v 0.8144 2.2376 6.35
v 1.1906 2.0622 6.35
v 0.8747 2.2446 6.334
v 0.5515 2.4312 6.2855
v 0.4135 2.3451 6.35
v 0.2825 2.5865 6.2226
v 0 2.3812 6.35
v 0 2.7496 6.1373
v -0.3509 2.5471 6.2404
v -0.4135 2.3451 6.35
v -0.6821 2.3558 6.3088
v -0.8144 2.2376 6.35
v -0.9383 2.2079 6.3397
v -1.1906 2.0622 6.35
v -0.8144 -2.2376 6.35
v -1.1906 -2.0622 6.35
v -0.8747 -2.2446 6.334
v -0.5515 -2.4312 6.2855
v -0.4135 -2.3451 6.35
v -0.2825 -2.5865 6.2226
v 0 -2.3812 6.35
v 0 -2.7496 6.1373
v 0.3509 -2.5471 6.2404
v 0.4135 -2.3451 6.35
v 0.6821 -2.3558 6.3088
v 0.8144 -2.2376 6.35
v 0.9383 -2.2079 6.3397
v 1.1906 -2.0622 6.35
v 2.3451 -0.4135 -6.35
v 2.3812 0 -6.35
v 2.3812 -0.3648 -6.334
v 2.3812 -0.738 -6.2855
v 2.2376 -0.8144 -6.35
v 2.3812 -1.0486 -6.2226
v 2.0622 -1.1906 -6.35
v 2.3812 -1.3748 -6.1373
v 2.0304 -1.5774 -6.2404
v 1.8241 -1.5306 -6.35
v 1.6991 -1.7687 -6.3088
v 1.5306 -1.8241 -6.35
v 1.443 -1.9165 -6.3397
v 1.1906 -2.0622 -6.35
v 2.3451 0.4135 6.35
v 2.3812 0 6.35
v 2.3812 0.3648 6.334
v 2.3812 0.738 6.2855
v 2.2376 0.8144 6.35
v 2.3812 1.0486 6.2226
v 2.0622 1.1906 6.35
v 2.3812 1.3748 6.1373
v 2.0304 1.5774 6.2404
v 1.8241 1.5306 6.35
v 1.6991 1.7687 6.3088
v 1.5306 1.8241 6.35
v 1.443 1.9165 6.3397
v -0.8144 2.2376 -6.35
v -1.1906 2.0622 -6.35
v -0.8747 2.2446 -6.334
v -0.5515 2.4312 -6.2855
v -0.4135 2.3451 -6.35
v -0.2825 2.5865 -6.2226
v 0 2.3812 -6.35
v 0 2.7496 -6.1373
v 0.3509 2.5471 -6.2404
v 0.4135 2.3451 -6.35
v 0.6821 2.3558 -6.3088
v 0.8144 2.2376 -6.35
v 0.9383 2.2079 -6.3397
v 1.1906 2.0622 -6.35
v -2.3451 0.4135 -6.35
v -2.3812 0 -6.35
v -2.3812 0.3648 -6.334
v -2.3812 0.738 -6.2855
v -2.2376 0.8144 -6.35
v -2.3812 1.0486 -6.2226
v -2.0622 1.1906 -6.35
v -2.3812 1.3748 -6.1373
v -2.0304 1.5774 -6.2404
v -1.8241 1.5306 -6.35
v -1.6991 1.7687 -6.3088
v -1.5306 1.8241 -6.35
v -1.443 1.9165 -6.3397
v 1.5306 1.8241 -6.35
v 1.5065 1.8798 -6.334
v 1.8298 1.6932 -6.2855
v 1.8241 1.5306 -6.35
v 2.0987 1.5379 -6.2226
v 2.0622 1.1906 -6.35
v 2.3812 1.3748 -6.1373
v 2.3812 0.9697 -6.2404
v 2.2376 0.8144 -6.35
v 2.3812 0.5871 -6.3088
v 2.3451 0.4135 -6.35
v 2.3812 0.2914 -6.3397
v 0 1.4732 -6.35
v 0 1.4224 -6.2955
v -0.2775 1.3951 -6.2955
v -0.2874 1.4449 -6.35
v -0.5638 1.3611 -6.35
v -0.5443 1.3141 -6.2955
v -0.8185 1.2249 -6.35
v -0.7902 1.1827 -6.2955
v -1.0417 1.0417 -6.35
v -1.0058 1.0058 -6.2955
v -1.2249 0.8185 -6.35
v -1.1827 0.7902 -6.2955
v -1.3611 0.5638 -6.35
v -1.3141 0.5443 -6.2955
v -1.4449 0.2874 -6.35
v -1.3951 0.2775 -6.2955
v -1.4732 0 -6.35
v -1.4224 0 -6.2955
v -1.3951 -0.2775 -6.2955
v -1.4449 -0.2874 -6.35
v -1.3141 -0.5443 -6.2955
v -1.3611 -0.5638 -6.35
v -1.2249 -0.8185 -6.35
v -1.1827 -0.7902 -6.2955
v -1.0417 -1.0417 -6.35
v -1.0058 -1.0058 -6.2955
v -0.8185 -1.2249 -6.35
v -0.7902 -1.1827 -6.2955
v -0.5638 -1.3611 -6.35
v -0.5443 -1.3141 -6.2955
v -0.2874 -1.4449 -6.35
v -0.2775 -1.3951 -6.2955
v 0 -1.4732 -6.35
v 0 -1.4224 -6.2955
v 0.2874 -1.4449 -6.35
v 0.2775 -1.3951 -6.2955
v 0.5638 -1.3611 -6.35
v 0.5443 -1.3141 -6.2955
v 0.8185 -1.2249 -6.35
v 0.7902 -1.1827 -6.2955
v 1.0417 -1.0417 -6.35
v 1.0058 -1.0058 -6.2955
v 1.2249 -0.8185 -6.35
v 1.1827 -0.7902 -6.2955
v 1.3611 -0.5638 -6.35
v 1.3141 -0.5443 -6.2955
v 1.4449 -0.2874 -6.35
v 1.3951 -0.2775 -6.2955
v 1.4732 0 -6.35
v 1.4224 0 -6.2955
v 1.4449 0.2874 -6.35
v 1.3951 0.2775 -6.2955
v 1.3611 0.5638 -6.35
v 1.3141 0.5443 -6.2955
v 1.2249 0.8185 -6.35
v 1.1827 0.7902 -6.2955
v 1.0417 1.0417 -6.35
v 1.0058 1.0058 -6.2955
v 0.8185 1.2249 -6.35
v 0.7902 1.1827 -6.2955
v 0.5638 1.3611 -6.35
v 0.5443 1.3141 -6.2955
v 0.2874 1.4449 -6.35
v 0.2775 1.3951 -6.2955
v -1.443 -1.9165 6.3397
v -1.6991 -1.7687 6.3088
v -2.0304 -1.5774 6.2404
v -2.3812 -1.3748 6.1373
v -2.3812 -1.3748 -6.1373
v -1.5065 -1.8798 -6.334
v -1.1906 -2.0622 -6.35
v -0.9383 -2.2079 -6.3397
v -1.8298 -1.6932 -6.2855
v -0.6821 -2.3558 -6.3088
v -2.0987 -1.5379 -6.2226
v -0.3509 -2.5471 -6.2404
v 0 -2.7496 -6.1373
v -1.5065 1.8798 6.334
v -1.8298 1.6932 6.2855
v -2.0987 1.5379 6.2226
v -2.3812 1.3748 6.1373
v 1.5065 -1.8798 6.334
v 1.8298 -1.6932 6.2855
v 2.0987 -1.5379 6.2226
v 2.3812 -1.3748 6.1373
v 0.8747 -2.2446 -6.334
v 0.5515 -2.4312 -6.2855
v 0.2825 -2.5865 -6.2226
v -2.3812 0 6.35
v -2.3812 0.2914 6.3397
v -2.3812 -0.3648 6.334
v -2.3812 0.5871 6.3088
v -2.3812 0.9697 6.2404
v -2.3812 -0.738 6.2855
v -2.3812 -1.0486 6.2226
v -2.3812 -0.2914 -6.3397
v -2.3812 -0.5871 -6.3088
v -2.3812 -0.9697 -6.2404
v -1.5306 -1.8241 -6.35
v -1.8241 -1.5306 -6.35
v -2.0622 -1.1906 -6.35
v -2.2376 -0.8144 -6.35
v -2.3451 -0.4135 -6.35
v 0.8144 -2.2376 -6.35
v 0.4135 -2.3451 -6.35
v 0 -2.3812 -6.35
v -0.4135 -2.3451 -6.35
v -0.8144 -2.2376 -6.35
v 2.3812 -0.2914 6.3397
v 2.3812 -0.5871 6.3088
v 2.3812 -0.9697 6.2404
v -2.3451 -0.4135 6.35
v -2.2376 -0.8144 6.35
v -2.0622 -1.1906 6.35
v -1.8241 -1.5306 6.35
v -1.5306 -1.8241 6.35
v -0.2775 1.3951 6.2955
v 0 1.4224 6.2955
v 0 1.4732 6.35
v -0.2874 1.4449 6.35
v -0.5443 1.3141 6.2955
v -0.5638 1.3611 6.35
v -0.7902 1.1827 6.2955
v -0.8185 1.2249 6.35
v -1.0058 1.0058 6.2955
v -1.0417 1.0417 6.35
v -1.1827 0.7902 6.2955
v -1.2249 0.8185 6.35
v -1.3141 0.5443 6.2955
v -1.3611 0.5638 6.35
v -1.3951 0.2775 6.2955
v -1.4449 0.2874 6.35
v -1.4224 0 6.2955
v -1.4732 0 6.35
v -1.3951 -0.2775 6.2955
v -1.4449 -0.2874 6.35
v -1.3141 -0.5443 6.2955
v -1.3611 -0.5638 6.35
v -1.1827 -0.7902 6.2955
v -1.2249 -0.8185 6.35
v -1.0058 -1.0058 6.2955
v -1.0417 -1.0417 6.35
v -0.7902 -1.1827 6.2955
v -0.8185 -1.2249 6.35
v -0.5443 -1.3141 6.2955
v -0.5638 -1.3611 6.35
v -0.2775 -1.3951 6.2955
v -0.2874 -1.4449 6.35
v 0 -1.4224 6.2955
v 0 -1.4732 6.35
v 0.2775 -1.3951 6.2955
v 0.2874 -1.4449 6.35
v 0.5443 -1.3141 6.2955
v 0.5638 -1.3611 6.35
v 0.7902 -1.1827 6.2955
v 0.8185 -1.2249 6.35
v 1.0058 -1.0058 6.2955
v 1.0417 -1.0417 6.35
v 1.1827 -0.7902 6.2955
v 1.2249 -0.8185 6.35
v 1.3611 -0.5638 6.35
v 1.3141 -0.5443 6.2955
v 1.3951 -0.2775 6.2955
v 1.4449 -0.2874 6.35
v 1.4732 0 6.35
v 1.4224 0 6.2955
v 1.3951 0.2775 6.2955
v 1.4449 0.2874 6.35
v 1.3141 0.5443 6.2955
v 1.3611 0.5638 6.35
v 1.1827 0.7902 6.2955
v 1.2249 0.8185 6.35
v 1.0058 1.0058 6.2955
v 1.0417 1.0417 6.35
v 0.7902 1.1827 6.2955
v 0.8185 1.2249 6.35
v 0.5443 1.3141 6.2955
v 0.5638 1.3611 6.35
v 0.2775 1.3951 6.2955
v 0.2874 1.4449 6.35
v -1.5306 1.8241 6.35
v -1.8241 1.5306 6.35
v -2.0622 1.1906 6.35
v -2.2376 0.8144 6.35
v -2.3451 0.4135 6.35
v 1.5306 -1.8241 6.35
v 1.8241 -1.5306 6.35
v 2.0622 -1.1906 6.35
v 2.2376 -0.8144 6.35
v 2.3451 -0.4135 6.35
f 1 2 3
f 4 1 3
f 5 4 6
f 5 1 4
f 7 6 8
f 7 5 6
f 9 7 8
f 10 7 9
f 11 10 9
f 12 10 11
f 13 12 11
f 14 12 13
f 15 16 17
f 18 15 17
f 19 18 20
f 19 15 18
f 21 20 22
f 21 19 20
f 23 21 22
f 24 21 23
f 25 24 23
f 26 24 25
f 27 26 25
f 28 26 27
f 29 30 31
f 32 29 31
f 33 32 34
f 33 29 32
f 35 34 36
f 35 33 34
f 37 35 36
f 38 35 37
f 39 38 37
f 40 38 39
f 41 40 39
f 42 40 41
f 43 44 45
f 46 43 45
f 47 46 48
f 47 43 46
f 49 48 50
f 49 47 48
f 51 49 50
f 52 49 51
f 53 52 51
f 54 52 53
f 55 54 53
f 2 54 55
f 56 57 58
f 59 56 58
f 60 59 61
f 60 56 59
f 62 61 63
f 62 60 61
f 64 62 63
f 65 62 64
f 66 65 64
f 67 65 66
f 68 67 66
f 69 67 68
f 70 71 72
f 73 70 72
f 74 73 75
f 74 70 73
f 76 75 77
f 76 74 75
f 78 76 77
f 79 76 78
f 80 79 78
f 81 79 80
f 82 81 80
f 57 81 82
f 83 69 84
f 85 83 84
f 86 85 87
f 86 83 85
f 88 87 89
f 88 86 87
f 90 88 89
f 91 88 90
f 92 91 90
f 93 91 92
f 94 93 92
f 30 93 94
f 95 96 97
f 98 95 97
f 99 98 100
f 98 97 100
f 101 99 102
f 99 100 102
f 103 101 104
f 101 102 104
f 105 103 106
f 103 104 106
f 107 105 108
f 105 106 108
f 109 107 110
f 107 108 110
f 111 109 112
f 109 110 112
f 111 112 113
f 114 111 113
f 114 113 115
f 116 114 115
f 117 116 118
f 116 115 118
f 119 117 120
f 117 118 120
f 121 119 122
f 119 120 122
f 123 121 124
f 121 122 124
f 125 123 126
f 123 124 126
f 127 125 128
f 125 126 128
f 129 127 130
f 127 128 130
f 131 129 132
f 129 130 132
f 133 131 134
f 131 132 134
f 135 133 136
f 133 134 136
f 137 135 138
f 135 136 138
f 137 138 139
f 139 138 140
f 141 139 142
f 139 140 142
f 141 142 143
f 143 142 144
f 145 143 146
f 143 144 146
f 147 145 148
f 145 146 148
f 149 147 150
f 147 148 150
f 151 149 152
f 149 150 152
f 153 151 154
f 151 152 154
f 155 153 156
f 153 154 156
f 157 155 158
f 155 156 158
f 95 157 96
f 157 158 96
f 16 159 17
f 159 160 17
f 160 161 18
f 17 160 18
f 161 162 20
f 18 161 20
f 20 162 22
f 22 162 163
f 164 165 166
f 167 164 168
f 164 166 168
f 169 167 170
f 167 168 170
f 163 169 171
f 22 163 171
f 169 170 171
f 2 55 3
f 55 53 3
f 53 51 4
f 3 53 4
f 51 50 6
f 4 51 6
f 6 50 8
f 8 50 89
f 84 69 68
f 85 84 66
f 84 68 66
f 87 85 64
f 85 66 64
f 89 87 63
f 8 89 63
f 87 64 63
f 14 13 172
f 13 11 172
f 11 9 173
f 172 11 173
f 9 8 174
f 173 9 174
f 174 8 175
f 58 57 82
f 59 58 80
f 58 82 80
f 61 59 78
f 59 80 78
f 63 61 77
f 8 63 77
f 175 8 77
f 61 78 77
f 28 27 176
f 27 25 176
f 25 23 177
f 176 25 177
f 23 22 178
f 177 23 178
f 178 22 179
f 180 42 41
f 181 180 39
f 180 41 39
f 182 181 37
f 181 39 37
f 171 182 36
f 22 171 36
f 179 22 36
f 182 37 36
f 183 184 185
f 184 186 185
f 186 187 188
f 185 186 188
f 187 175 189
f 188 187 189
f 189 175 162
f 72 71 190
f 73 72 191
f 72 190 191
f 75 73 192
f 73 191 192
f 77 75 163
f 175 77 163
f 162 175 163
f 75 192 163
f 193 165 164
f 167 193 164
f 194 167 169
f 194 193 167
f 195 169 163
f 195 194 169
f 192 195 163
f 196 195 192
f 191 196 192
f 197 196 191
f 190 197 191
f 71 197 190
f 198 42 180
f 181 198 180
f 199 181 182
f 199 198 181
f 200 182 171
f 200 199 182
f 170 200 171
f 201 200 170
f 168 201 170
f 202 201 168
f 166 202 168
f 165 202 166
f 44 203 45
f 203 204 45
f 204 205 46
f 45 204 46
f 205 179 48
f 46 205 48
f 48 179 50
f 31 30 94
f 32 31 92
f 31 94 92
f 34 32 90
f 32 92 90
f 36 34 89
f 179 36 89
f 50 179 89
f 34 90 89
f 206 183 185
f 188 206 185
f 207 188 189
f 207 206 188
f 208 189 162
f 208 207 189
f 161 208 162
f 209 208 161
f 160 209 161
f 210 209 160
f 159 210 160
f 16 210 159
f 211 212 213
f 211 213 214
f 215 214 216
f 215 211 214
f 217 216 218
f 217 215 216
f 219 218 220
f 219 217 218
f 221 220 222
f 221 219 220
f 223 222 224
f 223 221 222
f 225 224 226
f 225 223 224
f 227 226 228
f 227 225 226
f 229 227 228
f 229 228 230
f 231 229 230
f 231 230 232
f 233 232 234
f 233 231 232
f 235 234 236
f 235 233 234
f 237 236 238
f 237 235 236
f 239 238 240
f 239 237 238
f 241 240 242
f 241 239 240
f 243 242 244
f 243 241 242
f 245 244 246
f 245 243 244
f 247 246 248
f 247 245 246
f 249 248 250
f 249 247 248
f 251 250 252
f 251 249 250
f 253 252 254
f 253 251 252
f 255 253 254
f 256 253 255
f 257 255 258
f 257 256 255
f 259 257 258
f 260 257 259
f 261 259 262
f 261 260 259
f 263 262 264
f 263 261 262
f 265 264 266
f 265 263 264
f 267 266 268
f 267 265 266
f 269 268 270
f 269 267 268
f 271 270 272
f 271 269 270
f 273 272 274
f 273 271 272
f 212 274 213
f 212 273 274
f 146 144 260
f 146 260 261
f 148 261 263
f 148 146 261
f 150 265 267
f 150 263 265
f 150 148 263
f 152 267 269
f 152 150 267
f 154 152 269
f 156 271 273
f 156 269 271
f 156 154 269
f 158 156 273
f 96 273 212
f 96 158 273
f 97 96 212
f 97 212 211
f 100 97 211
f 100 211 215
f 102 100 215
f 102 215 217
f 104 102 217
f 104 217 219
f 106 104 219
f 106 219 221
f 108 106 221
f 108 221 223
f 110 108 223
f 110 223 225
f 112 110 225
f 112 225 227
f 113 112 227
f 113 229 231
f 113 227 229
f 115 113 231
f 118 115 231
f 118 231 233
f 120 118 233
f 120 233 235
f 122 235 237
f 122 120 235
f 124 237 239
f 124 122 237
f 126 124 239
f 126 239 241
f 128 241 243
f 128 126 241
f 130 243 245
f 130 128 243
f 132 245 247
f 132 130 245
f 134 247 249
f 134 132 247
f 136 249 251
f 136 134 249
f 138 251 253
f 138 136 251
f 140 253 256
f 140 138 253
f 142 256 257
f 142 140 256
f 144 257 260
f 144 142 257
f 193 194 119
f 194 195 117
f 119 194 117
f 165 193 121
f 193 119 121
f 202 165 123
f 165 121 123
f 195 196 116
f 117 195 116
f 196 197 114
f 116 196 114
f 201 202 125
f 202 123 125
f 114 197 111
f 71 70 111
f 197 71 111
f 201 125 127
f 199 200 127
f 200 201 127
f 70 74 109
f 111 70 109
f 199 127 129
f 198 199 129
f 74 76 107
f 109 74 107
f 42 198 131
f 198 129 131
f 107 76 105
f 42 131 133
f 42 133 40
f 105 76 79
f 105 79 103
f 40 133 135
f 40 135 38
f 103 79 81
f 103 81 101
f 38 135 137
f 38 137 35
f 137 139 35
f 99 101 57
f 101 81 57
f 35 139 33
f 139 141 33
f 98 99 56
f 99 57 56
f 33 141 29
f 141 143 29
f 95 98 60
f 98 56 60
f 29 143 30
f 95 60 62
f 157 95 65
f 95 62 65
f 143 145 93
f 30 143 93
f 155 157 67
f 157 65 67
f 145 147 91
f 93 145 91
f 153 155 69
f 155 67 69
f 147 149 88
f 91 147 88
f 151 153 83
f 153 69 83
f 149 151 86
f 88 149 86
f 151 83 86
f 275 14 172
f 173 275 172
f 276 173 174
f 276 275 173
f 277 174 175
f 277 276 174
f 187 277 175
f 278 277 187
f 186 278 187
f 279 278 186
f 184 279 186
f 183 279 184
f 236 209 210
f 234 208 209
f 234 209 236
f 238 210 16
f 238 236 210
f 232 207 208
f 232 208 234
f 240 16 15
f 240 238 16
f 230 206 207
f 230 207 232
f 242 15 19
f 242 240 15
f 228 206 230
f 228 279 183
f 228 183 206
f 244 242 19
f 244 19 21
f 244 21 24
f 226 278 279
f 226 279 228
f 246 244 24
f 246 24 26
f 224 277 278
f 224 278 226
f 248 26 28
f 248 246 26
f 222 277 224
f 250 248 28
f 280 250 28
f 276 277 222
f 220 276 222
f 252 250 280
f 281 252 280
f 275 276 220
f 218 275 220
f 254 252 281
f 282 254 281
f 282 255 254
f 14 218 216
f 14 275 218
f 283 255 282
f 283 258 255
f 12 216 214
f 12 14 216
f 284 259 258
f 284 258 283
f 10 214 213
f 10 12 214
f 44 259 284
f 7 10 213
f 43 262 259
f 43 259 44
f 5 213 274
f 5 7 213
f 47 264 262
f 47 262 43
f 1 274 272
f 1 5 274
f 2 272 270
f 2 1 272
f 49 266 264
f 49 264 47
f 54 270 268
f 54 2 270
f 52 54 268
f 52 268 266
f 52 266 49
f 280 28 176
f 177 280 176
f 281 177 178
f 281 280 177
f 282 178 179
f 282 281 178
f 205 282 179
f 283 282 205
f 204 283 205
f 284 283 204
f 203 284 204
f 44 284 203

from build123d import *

# Parameters (mm, degrees)
EXTRUDE1_DEPTH          = 6.35
EXTRUDE1_DEPTH_BACK     = 6.35
SKETCH1_R               = 1.4224
SKETCH8_OUTSIDE_W       = 58.916
SKETCH8_OUTSIDE_H       = 59.654
SKETCH8_OUTSIDE_R       = 2.38125
EXTRUDE4_DEPTH          = 14.210632851
EXTRUDE4_DRAFT          = -60
MIRROR1_COPY_1_SKETCH_W = 58.916
MIRROR1_COPY_1_SKETCH_H = 59.654
MIRROR1_COPY_1_SKETCH_R = 2.38125
MIRROR1_COPY_1_DEPTH    = 14.210632851
MIRROR1_COPY_1_DRAFT    = -60


with BuildPart() as part:
    # Sketch1 → Extrude1 (new, two sides: drawn at the far end of the back side and taken through both)
    with BuildSketch(Plane.XY.offset(-EXTRUDE1_DEPTH_BACK)):
        Polygon((0, 2.749630657), (-2.38125, 1.374815329), (-2.38125, -1.374815329), (0, -2.749630657), (2.38125, -1.374815329), (2.38125, 1.374815329), align=None)
        Circle(SKETCH1_R, mode=Mode.SUBTRACT)
    extrude(amount=EXTRUDE1_DEPTH + EXTRUDE1_DEPTH_BACK)

    # Extrude3 cone 1 section (through the dimple's axis) → Extrude3 (revolve, cut)
    with BuildSketch(Plane(origin=(0, 0, -6.35), x_dir=(0, 1, 0), z_dir=(1, 0, 0))):
        Polygon((0, 0), (1.4732, 0), (0, 1.579813584), align=None)
    extrude3 = revolve(axis=Axis((0, 0, -6.35), (0, 0, 1)), mode=Mode.SUBTRACT)


with BuildPart() as extrude4_tool:
    # Sketch8 outside → Extrude4 (with draft: the straight prism first)
    with BuildSketch(Plane(origin=(0, 0, -6.35), x_dir=(-1, 0, 0), z_dir=(0, 0, -1))):
        Rectangle(SKETCH8_OUTSIDE_W, SKETCH8_OUTSIDE_H)
        Circle(SKETCH8_OUTSIDE_R, mode=Mode.SUBTRACT)
    extrude(amount=-EXTRUDE4_DEPTH)
    # Extrude4: the draft: its side faces are tilted about the plane it starts from
    extrude4_sides = [extrude4_tool.faces().sort_by_distance(p)[0] for p in [
        (0, -29.827, 0.755316425),
        (-29.458, 0, 0.755316425),
        (0, 29.827, 0.755316425),
        (29.458, 0, 0.755316425),
        (2.38125, 0, 0.755316425),
    ]]
    draft(extrude4_sides, Plane(origin=(0, 0, -6.35), x_dir=(-1, 0, 0), z_dir=(0, 0, -1)), EXTRUDE4_DRAFT)


with BuildPart() as part_1:
    add(part.part)

    # Extrude4: cut by extrude4_tool
    add(extrude4_tool.part, mode=Mode.SUBTRACT)

    # Mirror1: Extrude3 across plane
    add(extrude3.mirror(Plane.XY), mode=Mode.SUBTRACT)


with BuildPart() as mirror1_copy_1_tool:
    # Mirror1 copy 1 sketch → Mirror1 copy 1 (with draft: the straight prism first)
    with BuildSketch(Plane(origin=(0, 0, 6.35), x_dir=(-1, 0, 0), z_dir=(0, 0, 1))):
        Rectangle(MIRROR1_COPY_1_SKETCH_W, MIRROR1_COPY_1_SKETCH_H)
        Circle(MIRROR1_COPY_1_SKETCH_R, mode=Mode.SUBTRACT)
    extrude(amount=-MIRROR1_COPY_1_DEPTH)
    # Mirror1 copy 1: the draft: its side faces are tilted about the plane it starts from
    mirror1_copy_1_sides = [mirror1_copy_1_tool.faces().sort_by_distance(p)[0] for p in [
        (0, -29.827, -0.755316425),
        (-29.458, 0, -0.755316425),
        (0, 29.827, -0.755316425),
        (29.458, 0, -0.755316425),
        (2.38125, 0, -0.755316425),
    ]]
    draft(mirror1_copy_1_sides, Plane(origin=(0, 0, 6.35), x_dir=(-1, 0, 0), z_dir=(0, 0, 1)), MIRROR1_COPY_1_DRAFT)


with BuildPart() as part_2:
    add(part_1.part)

    # Mirror1 copy 1: cut by mirror1_copy_1_tool
    add(mirror1_copy_1_tool.part, mode=Mode.SUBTRACT)


solid = part_2.part
